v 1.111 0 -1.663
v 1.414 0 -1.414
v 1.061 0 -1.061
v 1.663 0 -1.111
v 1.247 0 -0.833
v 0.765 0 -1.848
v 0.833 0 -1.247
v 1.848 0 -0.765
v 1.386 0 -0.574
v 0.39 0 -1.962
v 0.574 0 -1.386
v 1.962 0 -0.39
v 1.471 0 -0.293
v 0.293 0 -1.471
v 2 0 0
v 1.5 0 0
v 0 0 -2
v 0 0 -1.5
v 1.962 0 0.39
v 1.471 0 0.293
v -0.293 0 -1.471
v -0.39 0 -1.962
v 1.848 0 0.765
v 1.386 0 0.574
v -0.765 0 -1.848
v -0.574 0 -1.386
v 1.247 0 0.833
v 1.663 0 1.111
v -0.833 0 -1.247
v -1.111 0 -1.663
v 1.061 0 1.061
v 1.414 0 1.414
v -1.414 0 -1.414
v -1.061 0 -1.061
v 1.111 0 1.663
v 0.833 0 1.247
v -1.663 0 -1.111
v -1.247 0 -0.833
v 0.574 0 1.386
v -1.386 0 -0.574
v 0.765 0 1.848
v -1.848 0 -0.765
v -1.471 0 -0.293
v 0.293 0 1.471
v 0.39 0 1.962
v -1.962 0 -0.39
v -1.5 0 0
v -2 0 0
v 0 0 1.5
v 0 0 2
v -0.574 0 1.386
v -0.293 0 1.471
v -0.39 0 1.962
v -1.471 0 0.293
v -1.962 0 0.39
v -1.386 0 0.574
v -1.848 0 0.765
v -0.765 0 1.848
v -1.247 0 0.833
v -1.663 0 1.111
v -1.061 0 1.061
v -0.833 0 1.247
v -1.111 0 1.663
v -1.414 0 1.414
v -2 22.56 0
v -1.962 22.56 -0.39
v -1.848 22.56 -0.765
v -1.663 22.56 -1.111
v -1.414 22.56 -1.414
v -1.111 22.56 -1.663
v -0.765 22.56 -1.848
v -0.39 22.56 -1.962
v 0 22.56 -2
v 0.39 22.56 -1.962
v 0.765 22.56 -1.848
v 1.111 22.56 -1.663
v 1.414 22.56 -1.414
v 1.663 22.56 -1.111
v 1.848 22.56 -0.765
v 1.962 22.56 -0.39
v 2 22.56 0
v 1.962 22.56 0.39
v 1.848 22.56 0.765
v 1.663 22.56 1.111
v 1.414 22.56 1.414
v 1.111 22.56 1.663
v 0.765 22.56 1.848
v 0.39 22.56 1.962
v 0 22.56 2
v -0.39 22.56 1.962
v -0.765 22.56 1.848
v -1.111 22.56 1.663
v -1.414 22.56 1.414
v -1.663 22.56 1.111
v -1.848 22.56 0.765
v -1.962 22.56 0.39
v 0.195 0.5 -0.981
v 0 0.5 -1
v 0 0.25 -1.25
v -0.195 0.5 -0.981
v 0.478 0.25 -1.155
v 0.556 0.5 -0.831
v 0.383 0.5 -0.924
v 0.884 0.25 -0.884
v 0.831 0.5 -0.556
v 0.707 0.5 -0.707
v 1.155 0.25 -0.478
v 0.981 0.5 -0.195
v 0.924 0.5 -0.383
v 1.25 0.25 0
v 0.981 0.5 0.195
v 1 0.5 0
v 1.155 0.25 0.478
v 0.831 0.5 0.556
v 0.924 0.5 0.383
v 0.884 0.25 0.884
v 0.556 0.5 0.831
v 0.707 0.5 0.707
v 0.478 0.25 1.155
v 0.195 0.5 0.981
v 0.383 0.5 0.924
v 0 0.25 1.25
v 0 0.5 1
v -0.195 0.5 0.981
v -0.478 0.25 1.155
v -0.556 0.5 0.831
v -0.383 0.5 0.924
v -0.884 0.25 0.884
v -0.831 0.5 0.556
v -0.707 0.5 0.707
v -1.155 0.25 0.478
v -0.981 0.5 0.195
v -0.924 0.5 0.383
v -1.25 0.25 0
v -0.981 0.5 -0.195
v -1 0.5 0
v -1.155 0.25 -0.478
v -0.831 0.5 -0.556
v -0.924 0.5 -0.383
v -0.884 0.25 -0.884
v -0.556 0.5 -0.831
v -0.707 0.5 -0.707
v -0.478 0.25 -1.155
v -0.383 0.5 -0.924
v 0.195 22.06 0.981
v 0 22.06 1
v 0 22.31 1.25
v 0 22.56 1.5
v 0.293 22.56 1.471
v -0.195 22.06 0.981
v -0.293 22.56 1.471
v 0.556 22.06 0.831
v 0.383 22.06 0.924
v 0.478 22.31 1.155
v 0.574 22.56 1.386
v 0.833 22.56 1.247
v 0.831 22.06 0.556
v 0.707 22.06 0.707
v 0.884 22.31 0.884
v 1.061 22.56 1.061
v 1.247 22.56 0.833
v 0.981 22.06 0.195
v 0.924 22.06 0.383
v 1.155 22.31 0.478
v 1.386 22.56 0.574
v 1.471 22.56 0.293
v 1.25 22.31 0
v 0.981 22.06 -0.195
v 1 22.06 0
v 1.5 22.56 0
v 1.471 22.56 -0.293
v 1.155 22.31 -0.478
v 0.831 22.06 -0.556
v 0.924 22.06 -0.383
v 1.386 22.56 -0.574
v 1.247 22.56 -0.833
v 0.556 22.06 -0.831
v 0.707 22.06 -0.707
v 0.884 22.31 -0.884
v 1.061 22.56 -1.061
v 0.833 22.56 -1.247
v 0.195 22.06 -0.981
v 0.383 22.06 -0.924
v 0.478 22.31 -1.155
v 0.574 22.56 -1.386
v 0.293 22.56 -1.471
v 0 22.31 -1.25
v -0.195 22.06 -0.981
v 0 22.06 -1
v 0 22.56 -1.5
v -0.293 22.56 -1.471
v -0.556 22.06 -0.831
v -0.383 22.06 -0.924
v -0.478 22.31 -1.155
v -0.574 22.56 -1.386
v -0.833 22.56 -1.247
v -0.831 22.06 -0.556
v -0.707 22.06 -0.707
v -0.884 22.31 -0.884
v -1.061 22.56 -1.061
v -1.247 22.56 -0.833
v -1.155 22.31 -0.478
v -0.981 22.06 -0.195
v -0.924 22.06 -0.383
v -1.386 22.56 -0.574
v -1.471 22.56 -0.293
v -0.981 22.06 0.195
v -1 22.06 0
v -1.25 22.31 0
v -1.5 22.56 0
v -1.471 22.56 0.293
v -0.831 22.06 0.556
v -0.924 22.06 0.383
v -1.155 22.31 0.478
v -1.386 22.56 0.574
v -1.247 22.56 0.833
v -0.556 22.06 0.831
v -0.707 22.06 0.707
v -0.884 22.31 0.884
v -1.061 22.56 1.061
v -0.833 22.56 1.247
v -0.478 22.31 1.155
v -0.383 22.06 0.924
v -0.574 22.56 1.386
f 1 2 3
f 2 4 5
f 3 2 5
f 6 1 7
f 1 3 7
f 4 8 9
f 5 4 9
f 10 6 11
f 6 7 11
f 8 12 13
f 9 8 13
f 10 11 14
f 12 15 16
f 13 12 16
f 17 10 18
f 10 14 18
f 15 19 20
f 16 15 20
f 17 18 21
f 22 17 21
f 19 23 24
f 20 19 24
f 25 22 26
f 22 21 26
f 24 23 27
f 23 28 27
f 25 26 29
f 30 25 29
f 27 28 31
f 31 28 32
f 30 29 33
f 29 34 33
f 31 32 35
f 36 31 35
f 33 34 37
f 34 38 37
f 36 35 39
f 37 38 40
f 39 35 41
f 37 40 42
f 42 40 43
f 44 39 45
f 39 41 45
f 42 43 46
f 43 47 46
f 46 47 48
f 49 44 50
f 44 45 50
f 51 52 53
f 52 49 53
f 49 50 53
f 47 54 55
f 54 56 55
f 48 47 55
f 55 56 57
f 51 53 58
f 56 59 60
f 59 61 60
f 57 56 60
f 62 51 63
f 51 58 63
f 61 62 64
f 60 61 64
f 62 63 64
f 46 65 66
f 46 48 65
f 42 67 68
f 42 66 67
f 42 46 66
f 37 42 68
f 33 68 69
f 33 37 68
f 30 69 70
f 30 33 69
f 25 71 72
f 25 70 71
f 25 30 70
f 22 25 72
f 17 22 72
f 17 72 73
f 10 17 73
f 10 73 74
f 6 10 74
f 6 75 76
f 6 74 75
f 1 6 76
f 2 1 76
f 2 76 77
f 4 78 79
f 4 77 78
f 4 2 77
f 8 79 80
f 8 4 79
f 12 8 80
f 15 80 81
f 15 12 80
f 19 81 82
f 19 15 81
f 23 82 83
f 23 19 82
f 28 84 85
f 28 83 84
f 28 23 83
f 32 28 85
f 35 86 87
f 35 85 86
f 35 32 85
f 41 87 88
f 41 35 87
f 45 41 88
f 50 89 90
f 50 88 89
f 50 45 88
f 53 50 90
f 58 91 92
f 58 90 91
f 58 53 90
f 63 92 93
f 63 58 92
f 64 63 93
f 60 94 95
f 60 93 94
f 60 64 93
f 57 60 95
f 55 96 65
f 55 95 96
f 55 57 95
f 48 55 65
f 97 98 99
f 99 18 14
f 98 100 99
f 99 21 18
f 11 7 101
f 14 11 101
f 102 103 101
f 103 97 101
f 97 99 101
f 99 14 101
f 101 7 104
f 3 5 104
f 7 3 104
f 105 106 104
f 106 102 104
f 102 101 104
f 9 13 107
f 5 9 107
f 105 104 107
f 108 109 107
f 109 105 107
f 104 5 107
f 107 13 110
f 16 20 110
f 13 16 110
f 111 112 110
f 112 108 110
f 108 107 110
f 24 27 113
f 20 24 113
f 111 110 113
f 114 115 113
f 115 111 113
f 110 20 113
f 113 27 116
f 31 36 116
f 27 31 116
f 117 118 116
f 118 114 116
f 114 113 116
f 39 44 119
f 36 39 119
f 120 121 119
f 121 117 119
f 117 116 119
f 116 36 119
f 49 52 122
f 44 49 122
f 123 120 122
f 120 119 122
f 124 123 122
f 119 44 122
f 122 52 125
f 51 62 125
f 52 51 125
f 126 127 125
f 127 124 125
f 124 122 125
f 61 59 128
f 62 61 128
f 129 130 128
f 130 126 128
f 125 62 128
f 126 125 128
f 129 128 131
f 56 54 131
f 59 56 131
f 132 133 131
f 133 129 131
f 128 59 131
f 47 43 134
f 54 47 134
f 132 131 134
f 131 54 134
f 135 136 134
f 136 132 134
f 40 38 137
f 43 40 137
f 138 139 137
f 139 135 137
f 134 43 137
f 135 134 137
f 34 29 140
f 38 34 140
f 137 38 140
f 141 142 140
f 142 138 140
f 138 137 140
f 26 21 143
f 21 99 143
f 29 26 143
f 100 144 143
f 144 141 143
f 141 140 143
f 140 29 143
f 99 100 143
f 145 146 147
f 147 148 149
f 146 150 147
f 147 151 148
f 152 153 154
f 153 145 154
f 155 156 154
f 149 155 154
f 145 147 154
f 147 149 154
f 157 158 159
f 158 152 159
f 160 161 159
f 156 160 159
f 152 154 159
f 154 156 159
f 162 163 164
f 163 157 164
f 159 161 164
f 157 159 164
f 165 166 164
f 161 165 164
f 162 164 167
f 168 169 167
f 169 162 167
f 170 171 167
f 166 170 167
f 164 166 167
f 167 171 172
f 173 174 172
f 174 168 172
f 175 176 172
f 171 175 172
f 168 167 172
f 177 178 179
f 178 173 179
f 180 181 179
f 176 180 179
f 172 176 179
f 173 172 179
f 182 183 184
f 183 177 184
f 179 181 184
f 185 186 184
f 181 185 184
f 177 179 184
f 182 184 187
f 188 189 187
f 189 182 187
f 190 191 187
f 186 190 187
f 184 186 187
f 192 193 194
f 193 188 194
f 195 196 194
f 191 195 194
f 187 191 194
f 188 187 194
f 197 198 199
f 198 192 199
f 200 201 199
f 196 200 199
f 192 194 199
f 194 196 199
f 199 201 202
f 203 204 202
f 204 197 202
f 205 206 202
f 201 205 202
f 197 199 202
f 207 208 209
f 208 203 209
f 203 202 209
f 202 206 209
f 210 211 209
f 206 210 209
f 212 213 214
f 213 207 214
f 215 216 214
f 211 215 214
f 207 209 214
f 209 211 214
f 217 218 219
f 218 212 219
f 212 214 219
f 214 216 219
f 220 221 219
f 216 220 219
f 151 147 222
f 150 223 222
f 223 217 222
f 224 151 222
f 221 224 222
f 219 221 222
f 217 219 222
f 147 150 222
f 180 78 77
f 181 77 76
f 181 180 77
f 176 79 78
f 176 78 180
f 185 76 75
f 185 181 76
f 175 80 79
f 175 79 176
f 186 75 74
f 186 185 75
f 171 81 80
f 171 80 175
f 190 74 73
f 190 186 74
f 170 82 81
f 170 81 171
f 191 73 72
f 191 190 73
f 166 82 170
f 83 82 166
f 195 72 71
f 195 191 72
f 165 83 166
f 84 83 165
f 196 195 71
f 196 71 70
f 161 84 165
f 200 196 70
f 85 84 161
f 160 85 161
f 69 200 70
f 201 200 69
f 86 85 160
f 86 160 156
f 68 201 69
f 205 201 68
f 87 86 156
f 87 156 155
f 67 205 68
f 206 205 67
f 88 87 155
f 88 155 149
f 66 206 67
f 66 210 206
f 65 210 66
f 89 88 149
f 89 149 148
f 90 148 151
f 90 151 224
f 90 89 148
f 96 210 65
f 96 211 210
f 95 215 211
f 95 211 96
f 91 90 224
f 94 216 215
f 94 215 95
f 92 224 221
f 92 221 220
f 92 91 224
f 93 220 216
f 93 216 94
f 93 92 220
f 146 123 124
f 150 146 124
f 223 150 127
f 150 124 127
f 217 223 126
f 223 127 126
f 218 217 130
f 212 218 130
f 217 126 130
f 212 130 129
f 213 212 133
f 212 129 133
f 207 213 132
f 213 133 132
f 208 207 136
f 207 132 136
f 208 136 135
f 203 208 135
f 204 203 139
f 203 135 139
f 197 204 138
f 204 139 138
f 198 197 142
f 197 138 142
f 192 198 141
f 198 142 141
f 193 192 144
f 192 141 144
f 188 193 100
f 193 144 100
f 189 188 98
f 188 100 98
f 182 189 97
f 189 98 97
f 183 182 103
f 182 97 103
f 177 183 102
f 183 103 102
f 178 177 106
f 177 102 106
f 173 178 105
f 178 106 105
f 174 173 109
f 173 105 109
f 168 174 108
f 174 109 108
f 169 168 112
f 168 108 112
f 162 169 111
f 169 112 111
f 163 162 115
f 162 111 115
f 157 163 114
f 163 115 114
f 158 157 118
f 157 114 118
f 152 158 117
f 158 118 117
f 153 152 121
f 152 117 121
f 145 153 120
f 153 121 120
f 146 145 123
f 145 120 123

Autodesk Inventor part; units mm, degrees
ref_plane "YZ Plane" through (0, 0, 0) normal (1, 0, 0) x (0, 1, 0)
ref_plane "XZ Plane" through (0, 0, 0) normal (0, 1, 0) x (-1, 0, 0)
ref_plane "XY Plane" through (0, 0, 0) normal (0, 0, 1) x (1, 0, 0)
sketch "スケッチ1" plane through (0, 0, 0) normal (0, 1, 0) x (-1, 0, 0)
  circle A0 centre (0, 0) radius 2
  dimension "d0" = 4
extrude "押し出し1" add sketch "スケッチ1" along normal blind 22.56
sketch "スケッチ2" plane through (0, 22.56, 0) normal (0, 1, 0) x (1, 0, 0)
  point P0 (0, 0)
hole "穴1" at (0, 22.56, 0) direction (0, -1, 0) diameter 2 end through all countersink diameter 3 countersink angle 90 clearance for "Countersunk Flat Head Screw ISO 2009/7046" size "M2" standard "ISO"
sketch "スケッチ3" plane through (0, 0, 0) normal (0, -1, 0) x (1, 0, 0)
  point P0 (0, 0)
hole "穴2" at (0, 0, 0) direction (0, 1, 0) diameter 2 end through all countersink diameter 3 countersink angle 90 clearance for "Countersunk Flat Head Screw ISO 2009/7046" size "M2" standard "ISO"
properties part number "shaft" material "鉄、鋳鉄"
